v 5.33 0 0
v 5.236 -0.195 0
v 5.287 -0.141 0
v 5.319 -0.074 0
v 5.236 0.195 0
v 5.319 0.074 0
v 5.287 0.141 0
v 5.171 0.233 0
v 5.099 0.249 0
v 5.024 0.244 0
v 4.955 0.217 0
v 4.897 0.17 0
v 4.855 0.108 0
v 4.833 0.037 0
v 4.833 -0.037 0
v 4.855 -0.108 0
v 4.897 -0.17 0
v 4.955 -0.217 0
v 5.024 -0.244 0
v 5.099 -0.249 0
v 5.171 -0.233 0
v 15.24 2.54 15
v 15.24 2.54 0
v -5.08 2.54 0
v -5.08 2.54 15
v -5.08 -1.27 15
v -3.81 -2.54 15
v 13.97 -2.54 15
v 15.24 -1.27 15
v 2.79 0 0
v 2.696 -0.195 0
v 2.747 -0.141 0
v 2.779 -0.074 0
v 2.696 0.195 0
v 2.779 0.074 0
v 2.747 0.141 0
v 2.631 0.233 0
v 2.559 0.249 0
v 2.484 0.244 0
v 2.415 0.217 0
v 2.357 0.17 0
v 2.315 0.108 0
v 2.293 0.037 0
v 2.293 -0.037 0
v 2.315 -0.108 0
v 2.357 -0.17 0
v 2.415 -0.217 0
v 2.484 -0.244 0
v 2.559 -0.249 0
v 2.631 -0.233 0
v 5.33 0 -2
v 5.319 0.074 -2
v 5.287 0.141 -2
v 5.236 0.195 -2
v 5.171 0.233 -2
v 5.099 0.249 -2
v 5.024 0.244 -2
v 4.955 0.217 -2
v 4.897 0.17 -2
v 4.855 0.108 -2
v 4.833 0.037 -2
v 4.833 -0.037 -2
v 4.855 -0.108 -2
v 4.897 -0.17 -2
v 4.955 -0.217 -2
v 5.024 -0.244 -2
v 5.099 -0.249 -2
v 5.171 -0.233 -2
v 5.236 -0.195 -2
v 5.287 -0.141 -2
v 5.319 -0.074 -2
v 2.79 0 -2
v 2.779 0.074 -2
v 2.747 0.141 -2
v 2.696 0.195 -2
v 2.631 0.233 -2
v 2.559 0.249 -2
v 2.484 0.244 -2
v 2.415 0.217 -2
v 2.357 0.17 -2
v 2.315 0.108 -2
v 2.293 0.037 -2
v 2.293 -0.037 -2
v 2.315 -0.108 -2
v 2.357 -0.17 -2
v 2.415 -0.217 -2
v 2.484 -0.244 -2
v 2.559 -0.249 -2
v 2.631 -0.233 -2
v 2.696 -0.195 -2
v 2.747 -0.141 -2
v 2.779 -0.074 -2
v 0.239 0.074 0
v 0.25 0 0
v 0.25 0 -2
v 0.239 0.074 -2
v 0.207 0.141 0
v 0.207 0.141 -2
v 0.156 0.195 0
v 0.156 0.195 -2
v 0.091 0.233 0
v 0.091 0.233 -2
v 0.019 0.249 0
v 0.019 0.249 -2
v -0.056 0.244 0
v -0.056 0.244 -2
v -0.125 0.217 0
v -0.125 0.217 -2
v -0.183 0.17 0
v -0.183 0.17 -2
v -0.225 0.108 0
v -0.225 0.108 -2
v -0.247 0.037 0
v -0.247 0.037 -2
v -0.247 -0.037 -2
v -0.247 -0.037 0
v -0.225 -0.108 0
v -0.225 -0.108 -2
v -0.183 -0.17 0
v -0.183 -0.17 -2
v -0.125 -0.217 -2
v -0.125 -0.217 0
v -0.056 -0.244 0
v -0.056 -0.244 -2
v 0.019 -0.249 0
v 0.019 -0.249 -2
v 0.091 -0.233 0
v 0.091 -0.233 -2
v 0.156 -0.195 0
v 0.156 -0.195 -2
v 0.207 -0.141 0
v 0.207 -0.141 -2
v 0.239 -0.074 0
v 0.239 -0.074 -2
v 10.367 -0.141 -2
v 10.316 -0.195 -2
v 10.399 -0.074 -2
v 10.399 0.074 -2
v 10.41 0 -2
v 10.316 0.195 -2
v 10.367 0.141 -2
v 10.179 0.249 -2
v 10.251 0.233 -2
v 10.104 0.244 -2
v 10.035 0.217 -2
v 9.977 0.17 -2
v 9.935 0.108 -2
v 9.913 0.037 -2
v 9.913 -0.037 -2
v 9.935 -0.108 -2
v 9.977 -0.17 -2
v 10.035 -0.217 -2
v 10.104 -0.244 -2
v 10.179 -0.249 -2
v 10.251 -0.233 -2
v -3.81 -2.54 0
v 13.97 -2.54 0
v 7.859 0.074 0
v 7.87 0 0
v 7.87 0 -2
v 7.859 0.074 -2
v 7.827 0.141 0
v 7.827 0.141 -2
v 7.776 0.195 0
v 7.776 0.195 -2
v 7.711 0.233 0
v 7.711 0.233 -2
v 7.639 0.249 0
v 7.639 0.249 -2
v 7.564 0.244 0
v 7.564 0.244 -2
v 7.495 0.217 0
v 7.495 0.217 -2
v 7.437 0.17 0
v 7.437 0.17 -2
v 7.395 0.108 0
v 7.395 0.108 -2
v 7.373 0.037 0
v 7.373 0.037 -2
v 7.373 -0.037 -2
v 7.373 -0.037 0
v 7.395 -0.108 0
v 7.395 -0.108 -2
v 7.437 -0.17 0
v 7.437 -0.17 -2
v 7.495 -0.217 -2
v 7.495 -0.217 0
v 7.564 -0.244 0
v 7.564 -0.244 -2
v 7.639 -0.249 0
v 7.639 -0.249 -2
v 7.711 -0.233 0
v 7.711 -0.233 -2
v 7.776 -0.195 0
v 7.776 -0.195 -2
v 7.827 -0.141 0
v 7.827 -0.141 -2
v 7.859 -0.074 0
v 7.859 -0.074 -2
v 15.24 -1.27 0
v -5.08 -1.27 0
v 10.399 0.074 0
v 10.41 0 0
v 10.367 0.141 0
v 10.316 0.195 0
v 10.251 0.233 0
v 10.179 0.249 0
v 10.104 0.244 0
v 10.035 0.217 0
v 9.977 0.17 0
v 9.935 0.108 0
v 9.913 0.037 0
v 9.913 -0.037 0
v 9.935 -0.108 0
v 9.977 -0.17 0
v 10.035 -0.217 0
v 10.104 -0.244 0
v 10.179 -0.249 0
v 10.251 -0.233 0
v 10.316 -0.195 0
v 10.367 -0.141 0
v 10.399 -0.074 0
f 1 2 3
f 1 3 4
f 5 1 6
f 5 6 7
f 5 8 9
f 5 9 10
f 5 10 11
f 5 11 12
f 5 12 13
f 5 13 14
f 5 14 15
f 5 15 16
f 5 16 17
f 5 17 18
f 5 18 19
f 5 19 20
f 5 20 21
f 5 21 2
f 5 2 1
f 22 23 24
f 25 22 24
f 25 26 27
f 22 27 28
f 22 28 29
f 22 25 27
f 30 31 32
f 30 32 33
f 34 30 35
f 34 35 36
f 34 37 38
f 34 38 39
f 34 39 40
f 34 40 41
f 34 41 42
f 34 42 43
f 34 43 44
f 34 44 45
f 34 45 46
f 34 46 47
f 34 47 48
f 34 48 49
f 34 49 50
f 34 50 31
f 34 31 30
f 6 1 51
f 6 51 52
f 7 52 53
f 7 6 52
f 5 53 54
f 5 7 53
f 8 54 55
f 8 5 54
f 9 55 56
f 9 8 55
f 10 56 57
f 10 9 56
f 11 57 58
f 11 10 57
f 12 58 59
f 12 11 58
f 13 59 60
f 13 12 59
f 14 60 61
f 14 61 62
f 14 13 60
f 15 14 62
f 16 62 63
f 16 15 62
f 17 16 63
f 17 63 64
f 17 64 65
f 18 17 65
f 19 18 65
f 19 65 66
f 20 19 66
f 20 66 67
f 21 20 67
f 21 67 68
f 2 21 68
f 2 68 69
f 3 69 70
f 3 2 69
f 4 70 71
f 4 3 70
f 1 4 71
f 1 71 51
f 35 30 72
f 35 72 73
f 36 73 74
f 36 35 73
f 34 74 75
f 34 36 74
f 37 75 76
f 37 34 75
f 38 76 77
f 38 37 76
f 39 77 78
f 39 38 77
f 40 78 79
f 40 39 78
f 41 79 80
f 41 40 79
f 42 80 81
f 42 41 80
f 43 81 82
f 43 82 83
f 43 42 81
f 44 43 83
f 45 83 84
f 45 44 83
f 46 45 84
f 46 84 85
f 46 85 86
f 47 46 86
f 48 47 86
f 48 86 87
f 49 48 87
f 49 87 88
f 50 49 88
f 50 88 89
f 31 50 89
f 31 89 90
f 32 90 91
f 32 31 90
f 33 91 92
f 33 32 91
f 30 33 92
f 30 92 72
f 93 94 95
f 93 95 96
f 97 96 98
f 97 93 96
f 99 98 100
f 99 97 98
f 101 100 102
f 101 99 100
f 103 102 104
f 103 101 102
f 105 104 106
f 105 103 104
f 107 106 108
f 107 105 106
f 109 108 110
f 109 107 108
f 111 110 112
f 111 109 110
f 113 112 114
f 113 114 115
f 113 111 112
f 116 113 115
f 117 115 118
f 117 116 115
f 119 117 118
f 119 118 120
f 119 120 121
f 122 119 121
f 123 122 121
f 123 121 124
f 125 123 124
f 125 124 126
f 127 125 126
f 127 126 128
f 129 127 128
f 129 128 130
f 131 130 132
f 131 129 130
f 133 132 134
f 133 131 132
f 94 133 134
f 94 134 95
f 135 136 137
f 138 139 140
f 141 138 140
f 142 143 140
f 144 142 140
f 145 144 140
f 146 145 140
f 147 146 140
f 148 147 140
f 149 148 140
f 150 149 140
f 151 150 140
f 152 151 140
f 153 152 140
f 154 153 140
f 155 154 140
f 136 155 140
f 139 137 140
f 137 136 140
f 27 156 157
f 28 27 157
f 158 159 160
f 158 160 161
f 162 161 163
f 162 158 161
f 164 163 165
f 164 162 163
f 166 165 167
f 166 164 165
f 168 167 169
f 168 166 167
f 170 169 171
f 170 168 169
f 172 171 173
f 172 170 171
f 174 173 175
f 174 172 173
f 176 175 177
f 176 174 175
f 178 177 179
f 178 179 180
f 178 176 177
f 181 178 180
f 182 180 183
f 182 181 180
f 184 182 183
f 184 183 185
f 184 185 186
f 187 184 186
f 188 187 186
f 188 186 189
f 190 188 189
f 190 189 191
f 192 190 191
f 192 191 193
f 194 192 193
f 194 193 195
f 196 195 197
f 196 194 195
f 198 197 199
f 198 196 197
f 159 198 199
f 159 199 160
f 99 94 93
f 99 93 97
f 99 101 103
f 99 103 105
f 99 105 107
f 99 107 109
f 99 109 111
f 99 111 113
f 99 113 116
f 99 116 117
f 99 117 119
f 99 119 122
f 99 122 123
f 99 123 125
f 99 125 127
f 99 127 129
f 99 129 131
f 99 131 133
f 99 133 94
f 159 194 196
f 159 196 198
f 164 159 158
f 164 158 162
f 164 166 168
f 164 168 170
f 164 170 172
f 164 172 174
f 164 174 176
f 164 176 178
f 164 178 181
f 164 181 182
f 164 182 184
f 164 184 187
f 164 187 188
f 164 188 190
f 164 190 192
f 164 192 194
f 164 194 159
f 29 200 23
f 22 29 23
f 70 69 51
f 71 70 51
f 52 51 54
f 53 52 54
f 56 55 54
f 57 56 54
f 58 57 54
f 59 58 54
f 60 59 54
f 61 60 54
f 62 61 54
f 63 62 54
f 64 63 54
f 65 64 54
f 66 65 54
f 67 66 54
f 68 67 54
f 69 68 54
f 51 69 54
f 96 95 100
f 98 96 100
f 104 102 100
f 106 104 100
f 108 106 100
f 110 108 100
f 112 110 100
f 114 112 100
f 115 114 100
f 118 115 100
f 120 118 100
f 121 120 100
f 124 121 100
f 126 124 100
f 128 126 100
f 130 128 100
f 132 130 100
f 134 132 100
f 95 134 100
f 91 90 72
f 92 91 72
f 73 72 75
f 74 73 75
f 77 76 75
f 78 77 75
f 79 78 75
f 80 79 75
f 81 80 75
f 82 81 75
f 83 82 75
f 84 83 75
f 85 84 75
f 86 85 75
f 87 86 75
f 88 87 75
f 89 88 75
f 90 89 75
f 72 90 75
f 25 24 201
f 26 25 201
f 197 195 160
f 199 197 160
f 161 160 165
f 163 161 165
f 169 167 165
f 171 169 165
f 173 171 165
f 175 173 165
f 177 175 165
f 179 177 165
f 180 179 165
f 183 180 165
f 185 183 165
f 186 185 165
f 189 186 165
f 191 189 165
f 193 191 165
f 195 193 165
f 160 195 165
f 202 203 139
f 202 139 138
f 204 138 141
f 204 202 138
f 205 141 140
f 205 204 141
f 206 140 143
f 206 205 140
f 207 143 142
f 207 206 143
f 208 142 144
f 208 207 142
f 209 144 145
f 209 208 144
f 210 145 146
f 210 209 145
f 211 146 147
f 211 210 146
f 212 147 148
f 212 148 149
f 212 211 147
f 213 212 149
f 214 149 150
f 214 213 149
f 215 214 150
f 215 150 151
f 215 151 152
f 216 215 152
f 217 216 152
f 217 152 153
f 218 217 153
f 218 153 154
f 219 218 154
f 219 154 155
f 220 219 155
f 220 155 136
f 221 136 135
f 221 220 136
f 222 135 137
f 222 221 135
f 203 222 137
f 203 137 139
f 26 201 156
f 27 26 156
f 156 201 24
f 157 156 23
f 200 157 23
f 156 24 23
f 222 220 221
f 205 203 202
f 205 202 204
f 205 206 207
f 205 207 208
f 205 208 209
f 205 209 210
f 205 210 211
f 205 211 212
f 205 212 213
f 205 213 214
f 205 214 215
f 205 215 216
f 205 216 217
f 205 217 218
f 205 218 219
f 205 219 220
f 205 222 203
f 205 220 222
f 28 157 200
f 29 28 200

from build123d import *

# Parameters (mm, degrees)
COMPONENT_OUTLINE_DEPTH = 15
SKETCH2_R               = 0.25
EXTRUDE_1_DEPTH         = 2
SKETCH3_R               = 0.25
EXTRUDE_2_DEPTH         = 2
SKETCH4_R               = 0.25
EXTRUDE_3_DEPTH         = 2
SKETCH5_R               = 0.25
EXTRUDE_4_DEPTH         = 2
SKETCH6_R               = 0.25
EXTRUDE_5_DEPTH         = 2


with BuildPart() as part:
    # Sketch1 → Component_Outline (new body)
    with BuildSketch(Plane.XY):
        Polygon((-5.08, 2.54), (-5.08, -1.27), (-3.81, -2.54), (13.97, -2.54), (15.24, -1.27), (15.24, 2.54), align=None)
    extrude(amount=COMPONENT_OUTLINE_DEPTH)


with BuildPart() as body_2:
    # Sketch2 → Extrude 1 (new body)
    with BuildSketch(Plane.XY):
        Circle(SKETCH2_R)
    extrude(amount=-EXTRUDE_1_DEPTH)


with BuildPart() as body_3:
    # Sketch3 → Extrude 2 (new body)
    with BuildSketch(Plane.XY):
        with Locations((2.54, 0)):
            Circle(SKETCH3_R)
    extrude(amount=-EXTRUDE_2_DEPTH)


with BuildPart() as body_4:
    # Sketch4 → Extrude 3 (new body)
    with BuildSketch(Plane.XY):
        with Locations((5.08, 0)):
            Circle(SKETCH4_R)
    extrude(amount=-EXTRUDE_3_DEPTH)


with BuildPart() as body_5:
    # Sketch5 → Extrude 4 (new body)
    with BuildSketch(Plane.XY):
        with Locations((7.62, 0)):
            Circle(SKETCH5_R)
    extrude(amount=-EXTRUDE_4_DEPTH)


with BuildPart() as body_6:
    # Sketch6 → Extrude 5 (new body)
    with BuildSketch(Plane.XY):
        with Locations((10.16, 0)):
            Circle(SKETCH6_R)
    extrude(amount=-EXTRUDE_5_DEPTH)


solid = Compound([part.part, body_2.part, body_3.part, body_4.part, body_5.part, body_6.part])
